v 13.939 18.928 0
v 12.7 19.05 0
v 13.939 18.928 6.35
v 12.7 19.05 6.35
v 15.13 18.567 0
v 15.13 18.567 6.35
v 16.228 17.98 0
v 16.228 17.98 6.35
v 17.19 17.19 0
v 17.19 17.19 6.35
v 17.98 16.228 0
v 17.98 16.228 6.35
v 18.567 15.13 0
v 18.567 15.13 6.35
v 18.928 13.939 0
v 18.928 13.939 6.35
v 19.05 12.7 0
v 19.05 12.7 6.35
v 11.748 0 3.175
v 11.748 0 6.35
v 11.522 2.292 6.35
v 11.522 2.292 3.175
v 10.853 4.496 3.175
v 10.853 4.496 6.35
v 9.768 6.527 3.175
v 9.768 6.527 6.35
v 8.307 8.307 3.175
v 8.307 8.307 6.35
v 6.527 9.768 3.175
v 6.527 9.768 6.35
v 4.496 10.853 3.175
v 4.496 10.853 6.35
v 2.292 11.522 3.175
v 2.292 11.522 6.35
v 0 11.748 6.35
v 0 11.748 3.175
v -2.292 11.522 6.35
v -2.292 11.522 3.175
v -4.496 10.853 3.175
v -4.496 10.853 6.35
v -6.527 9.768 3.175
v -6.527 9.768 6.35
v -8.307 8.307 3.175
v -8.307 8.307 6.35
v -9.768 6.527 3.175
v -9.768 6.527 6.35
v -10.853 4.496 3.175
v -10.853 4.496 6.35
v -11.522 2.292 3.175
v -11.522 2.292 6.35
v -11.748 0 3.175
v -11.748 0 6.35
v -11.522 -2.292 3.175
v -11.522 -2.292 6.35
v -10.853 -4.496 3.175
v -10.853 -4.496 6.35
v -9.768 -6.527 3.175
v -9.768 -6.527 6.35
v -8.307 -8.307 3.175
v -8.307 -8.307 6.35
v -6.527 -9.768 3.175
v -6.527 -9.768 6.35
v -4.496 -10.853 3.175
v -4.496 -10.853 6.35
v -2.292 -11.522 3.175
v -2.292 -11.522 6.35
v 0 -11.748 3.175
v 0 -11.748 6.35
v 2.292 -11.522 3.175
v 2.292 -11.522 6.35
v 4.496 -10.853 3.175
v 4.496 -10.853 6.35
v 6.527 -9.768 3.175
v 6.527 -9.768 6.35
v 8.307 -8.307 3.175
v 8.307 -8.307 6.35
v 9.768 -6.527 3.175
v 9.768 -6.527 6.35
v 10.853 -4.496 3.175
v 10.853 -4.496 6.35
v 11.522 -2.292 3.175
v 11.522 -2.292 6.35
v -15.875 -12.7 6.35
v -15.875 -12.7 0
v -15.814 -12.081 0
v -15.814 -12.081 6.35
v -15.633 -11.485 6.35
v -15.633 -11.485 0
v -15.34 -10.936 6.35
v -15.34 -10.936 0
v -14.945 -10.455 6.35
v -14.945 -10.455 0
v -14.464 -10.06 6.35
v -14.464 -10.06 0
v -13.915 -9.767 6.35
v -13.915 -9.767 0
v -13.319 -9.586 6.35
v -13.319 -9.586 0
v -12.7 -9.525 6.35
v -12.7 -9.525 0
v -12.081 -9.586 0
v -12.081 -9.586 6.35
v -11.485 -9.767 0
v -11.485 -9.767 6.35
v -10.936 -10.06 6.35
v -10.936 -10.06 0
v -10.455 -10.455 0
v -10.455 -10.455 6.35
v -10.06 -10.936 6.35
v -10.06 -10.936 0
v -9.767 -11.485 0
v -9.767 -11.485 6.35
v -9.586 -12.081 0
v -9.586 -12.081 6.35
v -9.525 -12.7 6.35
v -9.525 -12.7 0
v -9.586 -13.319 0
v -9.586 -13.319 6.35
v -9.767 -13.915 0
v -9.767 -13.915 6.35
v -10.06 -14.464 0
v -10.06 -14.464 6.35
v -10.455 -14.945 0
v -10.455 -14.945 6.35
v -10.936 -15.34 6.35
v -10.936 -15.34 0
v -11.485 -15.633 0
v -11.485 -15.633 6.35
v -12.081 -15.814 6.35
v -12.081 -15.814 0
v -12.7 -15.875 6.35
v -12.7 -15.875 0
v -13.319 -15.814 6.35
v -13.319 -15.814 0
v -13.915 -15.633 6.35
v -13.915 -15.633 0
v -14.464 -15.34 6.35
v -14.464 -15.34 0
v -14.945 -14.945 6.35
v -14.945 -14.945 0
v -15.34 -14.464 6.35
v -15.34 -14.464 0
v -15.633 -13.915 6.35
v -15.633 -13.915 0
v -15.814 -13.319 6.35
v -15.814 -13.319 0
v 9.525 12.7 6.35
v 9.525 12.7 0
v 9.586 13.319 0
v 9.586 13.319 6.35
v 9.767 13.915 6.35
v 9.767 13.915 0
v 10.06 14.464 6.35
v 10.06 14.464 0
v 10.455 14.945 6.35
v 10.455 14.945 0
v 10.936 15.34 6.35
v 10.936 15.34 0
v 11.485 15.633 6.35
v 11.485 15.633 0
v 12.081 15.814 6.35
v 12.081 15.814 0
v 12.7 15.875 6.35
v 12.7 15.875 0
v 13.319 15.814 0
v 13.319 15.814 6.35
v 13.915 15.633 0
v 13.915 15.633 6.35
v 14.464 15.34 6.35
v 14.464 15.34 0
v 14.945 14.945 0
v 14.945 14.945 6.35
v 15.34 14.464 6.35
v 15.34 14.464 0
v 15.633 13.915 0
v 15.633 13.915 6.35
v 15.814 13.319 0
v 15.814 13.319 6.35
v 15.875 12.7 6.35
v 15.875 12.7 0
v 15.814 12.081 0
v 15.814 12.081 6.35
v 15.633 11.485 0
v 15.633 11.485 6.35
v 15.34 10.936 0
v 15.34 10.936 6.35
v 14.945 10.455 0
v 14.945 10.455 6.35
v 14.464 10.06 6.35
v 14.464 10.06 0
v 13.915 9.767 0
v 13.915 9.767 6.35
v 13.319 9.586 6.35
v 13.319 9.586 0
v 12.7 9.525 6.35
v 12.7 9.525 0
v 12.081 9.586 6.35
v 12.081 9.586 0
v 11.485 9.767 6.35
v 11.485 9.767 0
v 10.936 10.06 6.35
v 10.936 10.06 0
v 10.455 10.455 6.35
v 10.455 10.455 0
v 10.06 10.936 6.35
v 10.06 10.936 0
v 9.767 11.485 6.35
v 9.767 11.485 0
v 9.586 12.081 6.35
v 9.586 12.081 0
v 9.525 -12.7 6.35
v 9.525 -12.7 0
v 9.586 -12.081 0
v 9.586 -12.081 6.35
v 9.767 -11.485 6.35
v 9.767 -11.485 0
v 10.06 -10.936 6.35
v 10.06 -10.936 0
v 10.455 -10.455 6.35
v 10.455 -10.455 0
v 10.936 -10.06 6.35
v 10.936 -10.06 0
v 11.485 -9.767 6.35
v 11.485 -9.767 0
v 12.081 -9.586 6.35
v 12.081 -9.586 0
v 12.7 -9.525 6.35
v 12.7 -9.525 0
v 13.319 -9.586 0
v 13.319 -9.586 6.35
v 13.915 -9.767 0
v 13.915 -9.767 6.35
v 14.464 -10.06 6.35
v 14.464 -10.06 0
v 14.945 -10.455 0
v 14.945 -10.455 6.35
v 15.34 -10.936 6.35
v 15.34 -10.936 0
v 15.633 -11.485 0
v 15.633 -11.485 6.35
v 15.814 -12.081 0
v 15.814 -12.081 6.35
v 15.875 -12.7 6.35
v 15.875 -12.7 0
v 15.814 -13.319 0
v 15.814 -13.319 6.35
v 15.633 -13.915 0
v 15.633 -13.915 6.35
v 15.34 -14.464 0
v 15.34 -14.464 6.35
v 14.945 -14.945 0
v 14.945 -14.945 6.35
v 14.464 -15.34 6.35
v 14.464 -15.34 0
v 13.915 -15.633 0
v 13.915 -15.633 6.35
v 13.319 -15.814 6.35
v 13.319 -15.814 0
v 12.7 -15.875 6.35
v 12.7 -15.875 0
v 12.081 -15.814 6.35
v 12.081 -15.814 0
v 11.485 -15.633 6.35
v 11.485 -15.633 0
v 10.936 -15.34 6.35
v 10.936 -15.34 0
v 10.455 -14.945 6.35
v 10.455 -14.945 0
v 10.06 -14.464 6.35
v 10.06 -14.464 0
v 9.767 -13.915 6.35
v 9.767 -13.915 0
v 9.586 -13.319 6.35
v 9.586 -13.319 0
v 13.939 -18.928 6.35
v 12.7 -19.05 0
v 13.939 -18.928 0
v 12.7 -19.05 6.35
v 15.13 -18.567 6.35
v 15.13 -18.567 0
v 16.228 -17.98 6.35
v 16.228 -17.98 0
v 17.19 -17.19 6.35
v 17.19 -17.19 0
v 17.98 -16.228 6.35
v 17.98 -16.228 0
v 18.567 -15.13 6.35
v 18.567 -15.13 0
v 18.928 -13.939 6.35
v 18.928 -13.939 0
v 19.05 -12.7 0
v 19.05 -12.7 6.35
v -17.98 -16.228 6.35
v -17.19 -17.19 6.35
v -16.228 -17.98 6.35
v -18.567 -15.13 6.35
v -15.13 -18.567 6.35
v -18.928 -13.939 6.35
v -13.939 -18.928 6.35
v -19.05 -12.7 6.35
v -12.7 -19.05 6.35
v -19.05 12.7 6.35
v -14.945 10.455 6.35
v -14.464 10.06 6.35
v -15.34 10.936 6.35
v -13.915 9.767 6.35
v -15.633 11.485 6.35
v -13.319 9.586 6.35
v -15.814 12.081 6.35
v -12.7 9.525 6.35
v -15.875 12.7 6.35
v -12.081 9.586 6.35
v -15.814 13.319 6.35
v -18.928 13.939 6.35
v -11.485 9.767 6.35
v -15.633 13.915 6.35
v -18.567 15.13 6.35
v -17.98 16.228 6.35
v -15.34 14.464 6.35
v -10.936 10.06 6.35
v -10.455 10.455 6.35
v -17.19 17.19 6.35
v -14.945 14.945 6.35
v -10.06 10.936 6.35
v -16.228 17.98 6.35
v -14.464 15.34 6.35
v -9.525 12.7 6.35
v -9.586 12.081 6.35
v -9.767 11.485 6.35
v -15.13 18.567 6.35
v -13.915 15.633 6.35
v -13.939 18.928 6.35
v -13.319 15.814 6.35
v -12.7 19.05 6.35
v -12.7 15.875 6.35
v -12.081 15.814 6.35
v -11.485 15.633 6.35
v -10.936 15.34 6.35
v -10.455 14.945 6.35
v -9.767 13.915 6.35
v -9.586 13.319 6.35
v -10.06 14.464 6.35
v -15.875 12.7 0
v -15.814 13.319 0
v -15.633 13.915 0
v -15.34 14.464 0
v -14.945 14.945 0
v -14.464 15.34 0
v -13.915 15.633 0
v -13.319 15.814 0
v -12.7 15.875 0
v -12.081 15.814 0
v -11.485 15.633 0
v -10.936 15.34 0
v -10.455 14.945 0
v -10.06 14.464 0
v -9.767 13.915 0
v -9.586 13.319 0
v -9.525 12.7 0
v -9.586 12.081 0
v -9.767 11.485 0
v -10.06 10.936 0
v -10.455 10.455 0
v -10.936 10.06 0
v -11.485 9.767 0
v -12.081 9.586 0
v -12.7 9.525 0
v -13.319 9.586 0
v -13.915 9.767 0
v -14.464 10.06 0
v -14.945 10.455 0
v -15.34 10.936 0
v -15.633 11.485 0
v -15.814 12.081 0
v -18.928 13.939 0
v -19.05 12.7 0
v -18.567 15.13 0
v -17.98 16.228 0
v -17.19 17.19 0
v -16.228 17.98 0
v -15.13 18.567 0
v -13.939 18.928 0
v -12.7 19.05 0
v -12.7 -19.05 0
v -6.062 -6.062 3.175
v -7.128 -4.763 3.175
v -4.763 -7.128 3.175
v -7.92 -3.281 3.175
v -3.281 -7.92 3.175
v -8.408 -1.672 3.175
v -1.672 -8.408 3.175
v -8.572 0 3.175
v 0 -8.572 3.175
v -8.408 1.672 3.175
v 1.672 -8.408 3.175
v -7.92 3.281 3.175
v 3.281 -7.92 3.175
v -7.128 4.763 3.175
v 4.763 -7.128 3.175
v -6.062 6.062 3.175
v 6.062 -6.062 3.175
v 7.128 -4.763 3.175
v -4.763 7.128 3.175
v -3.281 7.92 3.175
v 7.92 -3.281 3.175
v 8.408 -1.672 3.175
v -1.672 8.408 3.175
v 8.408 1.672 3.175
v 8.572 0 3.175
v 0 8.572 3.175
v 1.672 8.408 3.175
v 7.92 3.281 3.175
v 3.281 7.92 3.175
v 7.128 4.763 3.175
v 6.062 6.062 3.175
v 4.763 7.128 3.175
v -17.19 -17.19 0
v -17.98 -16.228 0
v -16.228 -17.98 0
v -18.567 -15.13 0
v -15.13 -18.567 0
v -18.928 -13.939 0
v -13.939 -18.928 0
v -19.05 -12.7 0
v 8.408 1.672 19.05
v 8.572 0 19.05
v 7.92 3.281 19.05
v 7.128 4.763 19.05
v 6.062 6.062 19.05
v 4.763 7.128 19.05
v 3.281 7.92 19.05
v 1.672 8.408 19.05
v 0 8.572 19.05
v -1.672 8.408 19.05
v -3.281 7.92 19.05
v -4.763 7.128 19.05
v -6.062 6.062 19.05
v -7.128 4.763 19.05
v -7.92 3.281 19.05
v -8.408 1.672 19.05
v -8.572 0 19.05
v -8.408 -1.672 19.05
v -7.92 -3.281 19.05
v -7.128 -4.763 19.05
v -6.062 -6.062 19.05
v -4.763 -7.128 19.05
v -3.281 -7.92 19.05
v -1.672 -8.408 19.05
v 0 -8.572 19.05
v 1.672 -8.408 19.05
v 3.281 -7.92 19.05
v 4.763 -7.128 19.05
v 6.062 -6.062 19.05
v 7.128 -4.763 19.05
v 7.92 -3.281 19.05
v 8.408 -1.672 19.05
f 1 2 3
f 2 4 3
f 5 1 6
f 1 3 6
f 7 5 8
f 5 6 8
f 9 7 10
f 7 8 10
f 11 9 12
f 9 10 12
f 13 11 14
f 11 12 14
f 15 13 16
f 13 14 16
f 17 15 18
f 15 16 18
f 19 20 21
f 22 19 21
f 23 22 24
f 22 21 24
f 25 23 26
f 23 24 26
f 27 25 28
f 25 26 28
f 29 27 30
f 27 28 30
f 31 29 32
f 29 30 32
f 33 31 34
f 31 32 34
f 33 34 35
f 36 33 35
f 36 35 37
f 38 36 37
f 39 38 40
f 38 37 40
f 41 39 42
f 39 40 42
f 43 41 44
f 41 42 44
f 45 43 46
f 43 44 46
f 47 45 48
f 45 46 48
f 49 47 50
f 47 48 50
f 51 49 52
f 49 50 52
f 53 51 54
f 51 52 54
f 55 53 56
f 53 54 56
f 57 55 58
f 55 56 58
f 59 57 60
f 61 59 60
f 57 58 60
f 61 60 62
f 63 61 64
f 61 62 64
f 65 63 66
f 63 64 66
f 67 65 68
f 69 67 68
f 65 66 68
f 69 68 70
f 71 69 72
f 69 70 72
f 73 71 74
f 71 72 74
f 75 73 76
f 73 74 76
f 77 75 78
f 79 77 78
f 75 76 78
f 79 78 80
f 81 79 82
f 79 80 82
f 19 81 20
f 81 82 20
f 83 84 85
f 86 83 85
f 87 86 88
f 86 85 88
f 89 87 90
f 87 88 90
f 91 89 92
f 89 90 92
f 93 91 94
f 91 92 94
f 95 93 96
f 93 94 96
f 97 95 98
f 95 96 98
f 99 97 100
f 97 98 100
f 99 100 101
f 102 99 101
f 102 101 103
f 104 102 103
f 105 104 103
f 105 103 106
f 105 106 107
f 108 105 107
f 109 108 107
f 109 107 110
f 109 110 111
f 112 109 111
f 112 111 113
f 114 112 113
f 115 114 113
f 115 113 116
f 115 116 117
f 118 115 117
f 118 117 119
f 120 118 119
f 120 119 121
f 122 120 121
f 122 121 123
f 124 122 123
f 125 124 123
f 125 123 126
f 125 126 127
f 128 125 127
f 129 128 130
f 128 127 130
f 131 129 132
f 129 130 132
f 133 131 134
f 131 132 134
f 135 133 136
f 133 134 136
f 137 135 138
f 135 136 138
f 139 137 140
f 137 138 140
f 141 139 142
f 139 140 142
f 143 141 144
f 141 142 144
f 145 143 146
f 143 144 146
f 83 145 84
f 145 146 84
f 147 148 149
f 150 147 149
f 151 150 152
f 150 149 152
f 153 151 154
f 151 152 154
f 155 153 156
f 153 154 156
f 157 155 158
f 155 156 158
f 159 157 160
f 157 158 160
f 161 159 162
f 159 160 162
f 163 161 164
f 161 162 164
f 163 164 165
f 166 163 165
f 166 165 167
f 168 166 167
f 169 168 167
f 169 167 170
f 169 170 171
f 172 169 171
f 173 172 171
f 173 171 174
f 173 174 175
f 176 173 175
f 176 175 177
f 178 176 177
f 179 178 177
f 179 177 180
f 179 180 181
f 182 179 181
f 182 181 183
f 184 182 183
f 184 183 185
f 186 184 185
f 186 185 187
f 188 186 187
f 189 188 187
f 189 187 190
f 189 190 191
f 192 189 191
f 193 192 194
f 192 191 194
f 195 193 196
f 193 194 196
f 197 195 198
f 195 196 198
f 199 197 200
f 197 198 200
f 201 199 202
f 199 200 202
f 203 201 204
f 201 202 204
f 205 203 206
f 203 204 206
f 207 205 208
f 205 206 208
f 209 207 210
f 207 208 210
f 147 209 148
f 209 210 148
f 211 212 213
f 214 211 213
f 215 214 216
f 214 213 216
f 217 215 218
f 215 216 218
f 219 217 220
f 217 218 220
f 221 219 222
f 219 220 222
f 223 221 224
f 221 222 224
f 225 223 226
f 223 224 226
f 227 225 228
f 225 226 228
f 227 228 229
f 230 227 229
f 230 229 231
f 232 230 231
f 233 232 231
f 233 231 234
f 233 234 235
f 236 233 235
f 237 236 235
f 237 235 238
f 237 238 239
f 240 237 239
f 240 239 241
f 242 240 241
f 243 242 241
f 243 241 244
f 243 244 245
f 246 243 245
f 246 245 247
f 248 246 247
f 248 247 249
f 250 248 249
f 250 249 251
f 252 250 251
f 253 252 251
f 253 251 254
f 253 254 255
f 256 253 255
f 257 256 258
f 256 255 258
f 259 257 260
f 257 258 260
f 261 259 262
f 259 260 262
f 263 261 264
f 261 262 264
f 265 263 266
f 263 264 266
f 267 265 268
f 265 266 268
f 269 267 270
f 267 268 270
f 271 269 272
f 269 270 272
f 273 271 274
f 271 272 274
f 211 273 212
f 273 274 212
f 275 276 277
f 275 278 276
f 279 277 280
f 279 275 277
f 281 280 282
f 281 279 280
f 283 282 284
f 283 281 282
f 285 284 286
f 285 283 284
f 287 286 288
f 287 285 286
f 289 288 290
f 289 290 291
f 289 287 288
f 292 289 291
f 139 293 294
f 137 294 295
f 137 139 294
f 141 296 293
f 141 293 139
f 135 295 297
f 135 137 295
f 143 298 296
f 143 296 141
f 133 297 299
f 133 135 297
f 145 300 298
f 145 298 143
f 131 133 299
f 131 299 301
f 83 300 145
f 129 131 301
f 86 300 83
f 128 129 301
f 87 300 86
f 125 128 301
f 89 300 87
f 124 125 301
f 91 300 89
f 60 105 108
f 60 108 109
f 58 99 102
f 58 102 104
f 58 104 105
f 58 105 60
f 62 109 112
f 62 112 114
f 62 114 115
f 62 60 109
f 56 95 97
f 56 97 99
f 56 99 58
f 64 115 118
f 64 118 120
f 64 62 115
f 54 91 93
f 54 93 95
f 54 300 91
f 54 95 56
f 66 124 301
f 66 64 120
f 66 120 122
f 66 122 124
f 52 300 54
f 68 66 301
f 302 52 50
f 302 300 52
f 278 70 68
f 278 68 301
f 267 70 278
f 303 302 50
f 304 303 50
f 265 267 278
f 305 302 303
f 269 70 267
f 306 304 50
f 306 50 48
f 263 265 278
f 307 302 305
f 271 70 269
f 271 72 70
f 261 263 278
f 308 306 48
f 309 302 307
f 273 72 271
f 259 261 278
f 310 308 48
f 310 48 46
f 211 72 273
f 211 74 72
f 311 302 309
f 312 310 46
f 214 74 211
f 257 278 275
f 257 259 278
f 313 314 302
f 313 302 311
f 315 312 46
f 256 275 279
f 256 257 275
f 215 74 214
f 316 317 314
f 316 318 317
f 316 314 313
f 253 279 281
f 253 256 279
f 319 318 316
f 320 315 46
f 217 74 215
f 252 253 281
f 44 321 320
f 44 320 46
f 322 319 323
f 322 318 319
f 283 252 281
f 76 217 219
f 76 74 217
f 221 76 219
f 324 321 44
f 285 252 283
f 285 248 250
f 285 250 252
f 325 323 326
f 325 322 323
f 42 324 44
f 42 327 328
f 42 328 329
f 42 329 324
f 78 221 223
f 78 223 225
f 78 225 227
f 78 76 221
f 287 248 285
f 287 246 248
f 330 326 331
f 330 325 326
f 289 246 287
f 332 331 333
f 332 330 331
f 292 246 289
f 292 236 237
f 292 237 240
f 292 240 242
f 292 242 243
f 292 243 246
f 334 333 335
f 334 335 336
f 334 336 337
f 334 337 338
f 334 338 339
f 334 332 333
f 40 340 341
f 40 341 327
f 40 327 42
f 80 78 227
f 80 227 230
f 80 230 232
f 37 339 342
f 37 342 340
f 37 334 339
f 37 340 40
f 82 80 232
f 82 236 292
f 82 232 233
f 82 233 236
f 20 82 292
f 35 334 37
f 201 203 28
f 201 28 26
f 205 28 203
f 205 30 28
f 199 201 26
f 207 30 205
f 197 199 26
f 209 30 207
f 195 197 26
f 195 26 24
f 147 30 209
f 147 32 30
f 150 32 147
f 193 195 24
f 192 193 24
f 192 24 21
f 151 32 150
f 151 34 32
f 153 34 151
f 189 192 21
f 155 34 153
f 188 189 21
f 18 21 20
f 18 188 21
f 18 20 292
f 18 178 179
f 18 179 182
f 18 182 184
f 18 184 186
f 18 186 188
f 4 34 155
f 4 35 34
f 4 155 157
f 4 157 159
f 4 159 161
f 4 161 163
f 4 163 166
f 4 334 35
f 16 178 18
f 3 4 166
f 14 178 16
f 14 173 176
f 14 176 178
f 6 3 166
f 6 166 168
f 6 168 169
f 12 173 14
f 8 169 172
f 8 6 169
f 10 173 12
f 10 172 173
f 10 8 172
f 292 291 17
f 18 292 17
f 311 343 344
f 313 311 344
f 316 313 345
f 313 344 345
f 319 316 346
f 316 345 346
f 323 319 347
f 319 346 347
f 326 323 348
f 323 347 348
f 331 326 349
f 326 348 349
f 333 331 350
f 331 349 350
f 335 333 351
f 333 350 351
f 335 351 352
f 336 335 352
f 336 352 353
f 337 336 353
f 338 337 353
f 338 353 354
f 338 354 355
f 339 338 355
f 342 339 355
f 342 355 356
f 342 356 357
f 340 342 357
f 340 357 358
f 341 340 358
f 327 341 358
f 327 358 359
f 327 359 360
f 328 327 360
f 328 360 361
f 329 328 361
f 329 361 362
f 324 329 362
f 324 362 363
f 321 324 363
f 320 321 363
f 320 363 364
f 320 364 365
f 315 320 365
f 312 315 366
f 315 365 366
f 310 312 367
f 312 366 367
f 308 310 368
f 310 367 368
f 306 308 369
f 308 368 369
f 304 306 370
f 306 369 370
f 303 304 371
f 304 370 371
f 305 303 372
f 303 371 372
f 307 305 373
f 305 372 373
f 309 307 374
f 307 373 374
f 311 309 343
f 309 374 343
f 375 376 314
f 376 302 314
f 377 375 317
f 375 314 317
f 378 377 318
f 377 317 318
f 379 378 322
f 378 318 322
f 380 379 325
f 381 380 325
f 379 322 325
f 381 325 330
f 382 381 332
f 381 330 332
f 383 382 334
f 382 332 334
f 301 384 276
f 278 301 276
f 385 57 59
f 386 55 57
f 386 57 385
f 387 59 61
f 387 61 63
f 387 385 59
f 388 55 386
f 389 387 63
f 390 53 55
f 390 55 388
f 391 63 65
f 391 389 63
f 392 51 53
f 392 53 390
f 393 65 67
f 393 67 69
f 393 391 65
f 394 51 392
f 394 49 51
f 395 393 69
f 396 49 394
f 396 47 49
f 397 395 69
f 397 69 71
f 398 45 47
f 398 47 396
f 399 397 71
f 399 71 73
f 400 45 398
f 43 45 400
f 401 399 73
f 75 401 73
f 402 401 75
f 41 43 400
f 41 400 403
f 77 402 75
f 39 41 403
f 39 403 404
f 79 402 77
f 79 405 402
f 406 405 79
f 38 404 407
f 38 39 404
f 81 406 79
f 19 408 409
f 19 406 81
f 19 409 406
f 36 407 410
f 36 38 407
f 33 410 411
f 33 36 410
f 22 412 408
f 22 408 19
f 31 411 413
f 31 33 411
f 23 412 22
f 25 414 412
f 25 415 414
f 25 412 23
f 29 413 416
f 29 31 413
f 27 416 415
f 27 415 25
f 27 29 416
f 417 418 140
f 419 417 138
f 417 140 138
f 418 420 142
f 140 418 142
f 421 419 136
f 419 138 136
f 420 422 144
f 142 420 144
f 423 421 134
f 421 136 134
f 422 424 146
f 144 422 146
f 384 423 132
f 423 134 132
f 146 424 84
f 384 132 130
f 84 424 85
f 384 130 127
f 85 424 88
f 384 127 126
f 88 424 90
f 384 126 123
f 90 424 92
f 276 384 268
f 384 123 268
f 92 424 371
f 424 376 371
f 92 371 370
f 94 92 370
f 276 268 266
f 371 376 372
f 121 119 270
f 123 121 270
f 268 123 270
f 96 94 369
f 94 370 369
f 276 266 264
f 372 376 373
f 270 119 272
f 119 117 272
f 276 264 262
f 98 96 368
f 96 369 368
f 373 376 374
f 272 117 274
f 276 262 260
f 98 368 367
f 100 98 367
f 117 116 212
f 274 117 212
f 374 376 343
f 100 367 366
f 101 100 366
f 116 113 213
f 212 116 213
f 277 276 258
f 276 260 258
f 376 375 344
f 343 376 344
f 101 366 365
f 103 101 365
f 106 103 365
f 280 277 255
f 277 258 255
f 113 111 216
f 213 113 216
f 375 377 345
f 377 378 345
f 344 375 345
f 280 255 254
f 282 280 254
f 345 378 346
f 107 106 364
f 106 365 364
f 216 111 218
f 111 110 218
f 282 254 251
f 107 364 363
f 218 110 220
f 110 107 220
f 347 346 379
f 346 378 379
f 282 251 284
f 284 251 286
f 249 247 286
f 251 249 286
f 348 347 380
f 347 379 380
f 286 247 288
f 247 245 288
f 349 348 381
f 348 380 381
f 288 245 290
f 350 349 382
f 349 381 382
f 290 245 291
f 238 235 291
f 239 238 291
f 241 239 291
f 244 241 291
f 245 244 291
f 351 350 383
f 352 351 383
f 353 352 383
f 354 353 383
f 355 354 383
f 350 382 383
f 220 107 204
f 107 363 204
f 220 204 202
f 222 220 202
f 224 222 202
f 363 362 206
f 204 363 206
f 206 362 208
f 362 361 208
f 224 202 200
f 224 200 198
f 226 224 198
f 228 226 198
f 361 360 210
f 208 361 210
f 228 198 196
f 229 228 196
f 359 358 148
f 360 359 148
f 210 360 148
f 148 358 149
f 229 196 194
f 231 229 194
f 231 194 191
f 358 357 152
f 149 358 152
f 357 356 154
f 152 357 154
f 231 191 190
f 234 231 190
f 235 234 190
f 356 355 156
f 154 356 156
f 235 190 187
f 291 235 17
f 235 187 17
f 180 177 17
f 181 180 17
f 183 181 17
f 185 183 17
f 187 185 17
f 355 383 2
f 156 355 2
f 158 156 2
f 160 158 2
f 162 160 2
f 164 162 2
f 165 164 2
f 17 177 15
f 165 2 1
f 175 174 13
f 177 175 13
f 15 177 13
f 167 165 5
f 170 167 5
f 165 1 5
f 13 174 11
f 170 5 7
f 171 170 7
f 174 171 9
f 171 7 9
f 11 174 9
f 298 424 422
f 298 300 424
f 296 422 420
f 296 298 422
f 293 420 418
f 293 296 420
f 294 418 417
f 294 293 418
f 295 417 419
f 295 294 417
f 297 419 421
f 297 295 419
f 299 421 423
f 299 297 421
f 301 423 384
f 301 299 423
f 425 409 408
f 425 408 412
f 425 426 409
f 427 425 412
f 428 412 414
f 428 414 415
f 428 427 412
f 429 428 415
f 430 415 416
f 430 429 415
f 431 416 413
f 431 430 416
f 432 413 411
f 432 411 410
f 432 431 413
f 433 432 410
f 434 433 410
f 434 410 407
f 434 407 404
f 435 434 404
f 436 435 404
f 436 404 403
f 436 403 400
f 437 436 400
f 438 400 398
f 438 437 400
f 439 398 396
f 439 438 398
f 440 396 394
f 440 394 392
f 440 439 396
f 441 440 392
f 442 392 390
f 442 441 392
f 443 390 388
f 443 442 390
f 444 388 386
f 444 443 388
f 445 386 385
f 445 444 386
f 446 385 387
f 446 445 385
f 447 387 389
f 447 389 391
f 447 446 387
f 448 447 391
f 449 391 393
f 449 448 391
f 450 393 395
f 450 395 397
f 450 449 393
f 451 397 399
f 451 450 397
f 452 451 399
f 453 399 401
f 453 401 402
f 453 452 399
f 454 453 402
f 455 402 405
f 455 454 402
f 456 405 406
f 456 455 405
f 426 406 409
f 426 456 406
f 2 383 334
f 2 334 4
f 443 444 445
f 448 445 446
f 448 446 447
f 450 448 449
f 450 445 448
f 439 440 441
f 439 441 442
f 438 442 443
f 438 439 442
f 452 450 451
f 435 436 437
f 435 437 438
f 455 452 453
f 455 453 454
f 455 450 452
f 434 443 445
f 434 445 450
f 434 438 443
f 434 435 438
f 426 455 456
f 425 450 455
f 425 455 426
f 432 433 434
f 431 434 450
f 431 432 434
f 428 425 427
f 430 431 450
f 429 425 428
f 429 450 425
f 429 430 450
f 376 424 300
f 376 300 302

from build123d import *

# Parameters (mm, degrees)
F0_W     = 38.1
F0_H     = 38.1
F1_DEPTH = 6.35
F3_D     = 6.35
F4_R     = 6.35
F5_R     = 8.5725
F6_DEPTH = 12.7
F7_R     = 11.7475
F7_R_2   = 8.5725
F8_DEPTH = 3.175


with BuildPart() as f1:
    # F0 (on Top) → F1 (new body)
    with BuildSketch(Plane.XY):
        Rectangle(F0_W, F0_H)
    extrude(amount=F1_DEPTH)

    # F3 (through all)
    with Locations(Plane.XY.offset(6.35)):
        with Locations((-12.7, 12.7), (-12.7, -12.7), (12.7, -12.7), (12.7, 12.7)):
            Hole(F3_D / 2)

    # F4
    f4_edges = [f1.edges().sort_by_distance(p)[0] for p in [
        (-19.05, -19.05, 3.175),
        (19.05, -19.05, 3.175),
        (19.05, 19.05, 3.175),
        (-19.05, 19.05, 3.175),
    ]]
    fillet(f4_edges, radius=F4_R)

    # F5 (on face) → F6 (join)
    with BuildSketch(Plane.XY.offset(6.35)):
        Circle(F5_R)
    extrude(amount=F6_DEPTH)

    # F7 (on face) → F8 (cut)
    with BuildSketch(Plane.XY.offset(6.35)):
        Circle(F7_R)
        Circle(F7_R_2, mode=Mode.SUBTRACT)
    extrude(amount=-F8_DEPTH, mode=Mode.SUBTRACT)


solid = f1.part
